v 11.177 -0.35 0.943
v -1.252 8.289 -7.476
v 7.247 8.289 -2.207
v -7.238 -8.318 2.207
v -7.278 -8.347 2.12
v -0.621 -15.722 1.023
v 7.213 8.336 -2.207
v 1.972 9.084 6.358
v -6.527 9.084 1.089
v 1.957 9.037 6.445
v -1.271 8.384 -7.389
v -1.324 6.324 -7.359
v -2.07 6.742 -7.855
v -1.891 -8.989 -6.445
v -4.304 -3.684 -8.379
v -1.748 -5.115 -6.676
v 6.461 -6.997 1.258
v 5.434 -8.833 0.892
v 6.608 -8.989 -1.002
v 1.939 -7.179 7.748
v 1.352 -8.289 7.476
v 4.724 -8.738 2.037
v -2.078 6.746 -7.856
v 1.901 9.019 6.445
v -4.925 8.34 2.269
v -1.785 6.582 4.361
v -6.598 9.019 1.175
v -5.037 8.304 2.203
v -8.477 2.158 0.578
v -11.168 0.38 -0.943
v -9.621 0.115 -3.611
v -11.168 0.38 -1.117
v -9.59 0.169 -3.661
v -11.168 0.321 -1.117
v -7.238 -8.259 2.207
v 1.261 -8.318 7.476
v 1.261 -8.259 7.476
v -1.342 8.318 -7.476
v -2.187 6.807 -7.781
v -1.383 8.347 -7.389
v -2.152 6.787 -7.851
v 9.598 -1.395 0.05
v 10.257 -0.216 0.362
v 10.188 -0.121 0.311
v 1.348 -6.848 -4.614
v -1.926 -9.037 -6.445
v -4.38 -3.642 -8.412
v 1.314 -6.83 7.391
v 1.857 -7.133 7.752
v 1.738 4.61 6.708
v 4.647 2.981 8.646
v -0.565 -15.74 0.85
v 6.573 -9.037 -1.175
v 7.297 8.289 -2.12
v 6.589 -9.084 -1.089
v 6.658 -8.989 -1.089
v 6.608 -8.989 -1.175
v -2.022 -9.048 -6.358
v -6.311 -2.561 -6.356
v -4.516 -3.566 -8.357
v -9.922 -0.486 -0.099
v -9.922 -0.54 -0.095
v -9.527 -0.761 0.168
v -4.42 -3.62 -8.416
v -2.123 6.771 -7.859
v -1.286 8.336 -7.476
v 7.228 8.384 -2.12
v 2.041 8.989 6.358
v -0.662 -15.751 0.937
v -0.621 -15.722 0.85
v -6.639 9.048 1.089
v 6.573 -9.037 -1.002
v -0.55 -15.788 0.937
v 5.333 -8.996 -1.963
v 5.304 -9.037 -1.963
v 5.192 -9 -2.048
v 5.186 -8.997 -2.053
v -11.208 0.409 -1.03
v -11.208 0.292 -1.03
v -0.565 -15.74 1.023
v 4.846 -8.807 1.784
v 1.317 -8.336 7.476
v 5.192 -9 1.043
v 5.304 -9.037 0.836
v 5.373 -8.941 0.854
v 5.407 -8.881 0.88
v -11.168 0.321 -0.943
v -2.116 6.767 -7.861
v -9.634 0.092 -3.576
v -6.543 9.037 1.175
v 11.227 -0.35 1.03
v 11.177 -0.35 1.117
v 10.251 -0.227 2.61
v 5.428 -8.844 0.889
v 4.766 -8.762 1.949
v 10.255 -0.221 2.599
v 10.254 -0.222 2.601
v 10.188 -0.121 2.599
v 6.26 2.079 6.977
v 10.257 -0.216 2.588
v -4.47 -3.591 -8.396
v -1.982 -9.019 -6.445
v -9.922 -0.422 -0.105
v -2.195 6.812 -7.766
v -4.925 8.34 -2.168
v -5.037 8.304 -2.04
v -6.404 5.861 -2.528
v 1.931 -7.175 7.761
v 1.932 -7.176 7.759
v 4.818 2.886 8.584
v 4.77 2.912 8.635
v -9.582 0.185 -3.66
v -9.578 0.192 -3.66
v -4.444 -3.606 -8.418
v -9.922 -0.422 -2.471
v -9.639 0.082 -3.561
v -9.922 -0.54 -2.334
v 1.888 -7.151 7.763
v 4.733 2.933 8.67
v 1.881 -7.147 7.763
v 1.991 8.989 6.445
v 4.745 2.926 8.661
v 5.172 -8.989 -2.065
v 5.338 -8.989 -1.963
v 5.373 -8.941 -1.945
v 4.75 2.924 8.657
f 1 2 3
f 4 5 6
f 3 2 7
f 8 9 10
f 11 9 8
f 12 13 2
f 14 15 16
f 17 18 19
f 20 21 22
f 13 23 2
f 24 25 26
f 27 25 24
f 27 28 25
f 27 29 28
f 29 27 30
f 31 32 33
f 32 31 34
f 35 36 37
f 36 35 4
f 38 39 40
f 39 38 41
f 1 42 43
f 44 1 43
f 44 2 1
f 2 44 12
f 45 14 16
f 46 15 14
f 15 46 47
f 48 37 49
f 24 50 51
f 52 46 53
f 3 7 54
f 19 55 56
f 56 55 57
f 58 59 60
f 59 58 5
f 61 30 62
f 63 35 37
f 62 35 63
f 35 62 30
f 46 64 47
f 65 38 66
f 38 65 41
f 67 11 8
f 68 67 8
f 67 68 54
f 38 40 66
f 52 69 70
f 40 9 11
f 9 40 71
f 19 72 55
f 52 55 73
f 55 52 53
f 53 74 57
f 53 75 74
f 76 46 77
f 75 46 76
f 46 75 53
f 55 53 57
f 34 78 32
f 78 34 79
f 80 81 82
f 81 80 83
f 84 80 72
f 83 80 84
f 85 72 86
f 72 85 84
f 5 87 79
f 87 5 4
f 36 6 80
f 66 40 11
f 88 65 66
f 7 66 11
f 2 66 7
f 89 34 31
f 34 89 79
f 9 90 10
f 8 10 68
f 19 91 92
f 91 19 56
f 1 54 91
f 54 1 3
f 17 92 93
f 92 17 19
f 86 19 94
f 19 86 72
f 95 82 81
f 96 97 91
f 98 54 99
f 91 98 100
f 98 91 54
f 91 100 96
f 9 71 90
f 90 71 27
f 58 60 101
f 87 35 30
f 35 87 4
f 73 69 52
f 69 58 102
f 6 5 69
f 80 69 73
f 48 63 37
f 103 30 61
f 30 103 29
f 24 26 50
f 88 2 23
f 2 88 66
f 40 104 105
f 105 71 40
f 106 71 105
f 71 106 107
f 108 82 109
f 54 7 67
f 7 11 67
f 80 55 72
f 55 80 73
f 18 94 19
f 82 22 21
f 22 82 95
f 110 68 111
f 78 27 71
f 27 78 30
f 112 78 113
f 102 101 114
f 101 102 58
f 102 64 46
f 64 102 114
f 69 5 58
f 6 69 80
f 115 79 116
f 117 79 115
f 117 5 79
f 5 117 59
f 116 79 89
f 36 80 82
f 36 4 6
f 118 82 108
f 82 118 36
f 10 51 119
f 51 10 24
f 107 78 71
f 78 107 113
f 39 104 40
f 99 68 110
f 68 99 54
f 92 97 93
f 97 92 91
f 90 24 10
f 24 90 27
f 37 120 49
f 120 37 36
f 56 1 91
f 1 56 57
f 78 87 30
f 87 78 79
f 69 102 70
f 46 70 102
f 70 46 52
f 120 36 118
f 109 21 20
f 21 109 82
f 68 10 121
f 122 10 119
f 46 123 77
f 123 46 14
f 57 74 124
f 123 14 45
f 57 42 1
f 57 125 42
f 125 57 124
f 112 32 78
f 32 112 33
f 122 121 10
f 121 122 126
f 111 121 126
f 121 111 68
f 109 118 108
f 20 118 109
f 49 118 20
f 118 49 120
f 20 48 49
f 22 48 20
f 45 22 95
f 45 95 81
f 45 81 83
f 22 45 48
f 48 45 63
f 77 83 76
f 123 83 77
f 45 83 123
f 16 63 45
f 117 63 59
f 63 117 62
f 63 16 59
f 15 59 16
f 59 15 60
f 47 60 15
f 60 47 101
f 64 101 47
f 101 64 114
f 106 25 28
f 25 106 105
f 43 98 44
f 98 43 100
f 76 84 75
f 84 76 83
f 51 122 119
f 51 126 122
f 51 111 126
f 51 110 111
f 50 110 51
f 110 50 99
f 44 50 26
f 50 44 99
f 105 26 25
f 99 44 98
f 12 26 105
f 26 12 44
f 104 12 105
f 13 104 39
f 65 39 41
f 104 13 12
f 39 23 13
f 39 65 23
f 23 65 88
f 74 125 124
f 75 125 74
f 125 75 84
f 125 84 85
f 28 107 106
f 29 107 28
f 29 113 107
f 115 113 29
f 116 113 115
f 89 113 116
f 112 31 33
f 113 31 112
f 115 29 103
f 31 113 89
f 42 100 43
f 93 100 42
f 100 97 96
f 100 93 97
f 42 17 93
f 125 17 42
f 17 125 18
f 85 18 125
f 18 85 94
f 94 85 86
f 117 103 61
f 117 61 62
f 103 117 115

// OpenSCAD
// Auto-generated OpenSCAD file

    inner_points = 10*[[0.5272841921394986, -0.8941494324725834, -0.5000000000002047], [1.0157495787801158, -0.02156616077066012, -0.5000000000002183], [-0.9840743682826907, -0.048102565072366016, 0.5000000000002183], [-0.49560898164207345, 0.8244807066295572, 0.5000000000002047], [-0.22839508807181572, -0.47112599877236716, -0.9999999999999931], [0.5272841921397184, -0.8941494324726909, 0.4999999999997952], [0.2600702985688014, 0.401457272929556, -1.0000000000000067], [1.0157495787803354, -0.021566160770767534, 0.49999999999978156], [-0.9840743682829104, -0.0481025650722586, -0.49999999999978156], [-0.22839508807137623, -0.4711259987725822, 1.0000000000000067], [-0.4956089816422933, 0.8244807066296647, -0.4999999999997952], [0.26007029856924085, 0.4014572729293411, 0.9999999999999931], [-0.6705068091423759, 0.3493759475629592, -1.3623724356956024]];

    outer_points = 10*[[-0.5871016774818598, -0.035032029076049194, -0.9508335170979203], [-1.1127273597817333, 0.035032029076049194, -0.10300766831643143], [1.1127273597817333, -0.035032029076049194, 0.10300766831643143], [0.5871016774818598, 0.035032029076049194, 0.9508335170979203], [-0.1941165129402417, -0.8989291704166398, -0.6358027414048893], [-0.1301723233916815, 0.8288651122645414, -0.7389437000837753], [-0.7197421952401151, -0.8288651122645414, 0.21202310737659946], [-0.6557980056915549, 0.8989291704166398, 0.10888214869771351], [0.6557980056915549, -0.8989291704166398, -0.10888214869771351], [0.7197421952401151, 0.8288651122645414, -0.21202310737659946], [0.1301723233916815, -0.8288651122645414, 0.7389437000837753], [0.1941165129402417, 0.8989291704166398, 0.6358027414048893], [-0.05807720084257707, -1.5692662035184195, 0.09367759939690216]];

    // Convex hull for inner set (I)
    module inner_hull() {
        hull() {
            for (p = inner_points) {
                translate(p) sphere(r=0.1);
            }
        }
    }

    // Convex hull for outer set (O) minus inner hull (O \ I)
    module outer_minus_inner() {
        difference() {
            hull() {
                for (p = outer_points) {
                    translate(p) sphere(r=0.1);
                }
            }
            inner_hull(); // Subtract inner hull
        }
    }

    // Convex hull for outer set (O) minus all translated inner hulls
    module outer_minus_AllTranslationInner() {
        difference() {
            hull() {
                for (p = outer_points) {
                    translate(p) sphere(r=0.1);
                }
            }
            hull() {
                translate([0,0,50]) inner_hull();
                translate([0,0,-50]) inner_hull();
            }; // Subtract translated inner hulls
        }
    }

    // Difference between outer_minus_inner and outer_minus_AllTranslationInner
    module outer_minus_inner_diff() {
        difference() {
            // Outer minus inner
            difference() {
                hull() {
                    for (p = outer_points) {
                        translate(p) sphere(r=0.1);
                    }
                }
                inner_hull();
            }

            // Subtract Outer minus AllTranslationInner
            difference() {
                hull() {
                    for (p = outer_points) {
                        translate(p) sphere(r=0.1);
                    }
                }
                hull() {
                    translate([0,0,50]) inner_hull();
                    translate([0,0,-50]) inner_hull();
                };
            }
        }
    }

    // Rendering all with colors applied
    color([0, 1, 0, 1]) outer_minus_AllTranslationInner(); // Opaque green
    
